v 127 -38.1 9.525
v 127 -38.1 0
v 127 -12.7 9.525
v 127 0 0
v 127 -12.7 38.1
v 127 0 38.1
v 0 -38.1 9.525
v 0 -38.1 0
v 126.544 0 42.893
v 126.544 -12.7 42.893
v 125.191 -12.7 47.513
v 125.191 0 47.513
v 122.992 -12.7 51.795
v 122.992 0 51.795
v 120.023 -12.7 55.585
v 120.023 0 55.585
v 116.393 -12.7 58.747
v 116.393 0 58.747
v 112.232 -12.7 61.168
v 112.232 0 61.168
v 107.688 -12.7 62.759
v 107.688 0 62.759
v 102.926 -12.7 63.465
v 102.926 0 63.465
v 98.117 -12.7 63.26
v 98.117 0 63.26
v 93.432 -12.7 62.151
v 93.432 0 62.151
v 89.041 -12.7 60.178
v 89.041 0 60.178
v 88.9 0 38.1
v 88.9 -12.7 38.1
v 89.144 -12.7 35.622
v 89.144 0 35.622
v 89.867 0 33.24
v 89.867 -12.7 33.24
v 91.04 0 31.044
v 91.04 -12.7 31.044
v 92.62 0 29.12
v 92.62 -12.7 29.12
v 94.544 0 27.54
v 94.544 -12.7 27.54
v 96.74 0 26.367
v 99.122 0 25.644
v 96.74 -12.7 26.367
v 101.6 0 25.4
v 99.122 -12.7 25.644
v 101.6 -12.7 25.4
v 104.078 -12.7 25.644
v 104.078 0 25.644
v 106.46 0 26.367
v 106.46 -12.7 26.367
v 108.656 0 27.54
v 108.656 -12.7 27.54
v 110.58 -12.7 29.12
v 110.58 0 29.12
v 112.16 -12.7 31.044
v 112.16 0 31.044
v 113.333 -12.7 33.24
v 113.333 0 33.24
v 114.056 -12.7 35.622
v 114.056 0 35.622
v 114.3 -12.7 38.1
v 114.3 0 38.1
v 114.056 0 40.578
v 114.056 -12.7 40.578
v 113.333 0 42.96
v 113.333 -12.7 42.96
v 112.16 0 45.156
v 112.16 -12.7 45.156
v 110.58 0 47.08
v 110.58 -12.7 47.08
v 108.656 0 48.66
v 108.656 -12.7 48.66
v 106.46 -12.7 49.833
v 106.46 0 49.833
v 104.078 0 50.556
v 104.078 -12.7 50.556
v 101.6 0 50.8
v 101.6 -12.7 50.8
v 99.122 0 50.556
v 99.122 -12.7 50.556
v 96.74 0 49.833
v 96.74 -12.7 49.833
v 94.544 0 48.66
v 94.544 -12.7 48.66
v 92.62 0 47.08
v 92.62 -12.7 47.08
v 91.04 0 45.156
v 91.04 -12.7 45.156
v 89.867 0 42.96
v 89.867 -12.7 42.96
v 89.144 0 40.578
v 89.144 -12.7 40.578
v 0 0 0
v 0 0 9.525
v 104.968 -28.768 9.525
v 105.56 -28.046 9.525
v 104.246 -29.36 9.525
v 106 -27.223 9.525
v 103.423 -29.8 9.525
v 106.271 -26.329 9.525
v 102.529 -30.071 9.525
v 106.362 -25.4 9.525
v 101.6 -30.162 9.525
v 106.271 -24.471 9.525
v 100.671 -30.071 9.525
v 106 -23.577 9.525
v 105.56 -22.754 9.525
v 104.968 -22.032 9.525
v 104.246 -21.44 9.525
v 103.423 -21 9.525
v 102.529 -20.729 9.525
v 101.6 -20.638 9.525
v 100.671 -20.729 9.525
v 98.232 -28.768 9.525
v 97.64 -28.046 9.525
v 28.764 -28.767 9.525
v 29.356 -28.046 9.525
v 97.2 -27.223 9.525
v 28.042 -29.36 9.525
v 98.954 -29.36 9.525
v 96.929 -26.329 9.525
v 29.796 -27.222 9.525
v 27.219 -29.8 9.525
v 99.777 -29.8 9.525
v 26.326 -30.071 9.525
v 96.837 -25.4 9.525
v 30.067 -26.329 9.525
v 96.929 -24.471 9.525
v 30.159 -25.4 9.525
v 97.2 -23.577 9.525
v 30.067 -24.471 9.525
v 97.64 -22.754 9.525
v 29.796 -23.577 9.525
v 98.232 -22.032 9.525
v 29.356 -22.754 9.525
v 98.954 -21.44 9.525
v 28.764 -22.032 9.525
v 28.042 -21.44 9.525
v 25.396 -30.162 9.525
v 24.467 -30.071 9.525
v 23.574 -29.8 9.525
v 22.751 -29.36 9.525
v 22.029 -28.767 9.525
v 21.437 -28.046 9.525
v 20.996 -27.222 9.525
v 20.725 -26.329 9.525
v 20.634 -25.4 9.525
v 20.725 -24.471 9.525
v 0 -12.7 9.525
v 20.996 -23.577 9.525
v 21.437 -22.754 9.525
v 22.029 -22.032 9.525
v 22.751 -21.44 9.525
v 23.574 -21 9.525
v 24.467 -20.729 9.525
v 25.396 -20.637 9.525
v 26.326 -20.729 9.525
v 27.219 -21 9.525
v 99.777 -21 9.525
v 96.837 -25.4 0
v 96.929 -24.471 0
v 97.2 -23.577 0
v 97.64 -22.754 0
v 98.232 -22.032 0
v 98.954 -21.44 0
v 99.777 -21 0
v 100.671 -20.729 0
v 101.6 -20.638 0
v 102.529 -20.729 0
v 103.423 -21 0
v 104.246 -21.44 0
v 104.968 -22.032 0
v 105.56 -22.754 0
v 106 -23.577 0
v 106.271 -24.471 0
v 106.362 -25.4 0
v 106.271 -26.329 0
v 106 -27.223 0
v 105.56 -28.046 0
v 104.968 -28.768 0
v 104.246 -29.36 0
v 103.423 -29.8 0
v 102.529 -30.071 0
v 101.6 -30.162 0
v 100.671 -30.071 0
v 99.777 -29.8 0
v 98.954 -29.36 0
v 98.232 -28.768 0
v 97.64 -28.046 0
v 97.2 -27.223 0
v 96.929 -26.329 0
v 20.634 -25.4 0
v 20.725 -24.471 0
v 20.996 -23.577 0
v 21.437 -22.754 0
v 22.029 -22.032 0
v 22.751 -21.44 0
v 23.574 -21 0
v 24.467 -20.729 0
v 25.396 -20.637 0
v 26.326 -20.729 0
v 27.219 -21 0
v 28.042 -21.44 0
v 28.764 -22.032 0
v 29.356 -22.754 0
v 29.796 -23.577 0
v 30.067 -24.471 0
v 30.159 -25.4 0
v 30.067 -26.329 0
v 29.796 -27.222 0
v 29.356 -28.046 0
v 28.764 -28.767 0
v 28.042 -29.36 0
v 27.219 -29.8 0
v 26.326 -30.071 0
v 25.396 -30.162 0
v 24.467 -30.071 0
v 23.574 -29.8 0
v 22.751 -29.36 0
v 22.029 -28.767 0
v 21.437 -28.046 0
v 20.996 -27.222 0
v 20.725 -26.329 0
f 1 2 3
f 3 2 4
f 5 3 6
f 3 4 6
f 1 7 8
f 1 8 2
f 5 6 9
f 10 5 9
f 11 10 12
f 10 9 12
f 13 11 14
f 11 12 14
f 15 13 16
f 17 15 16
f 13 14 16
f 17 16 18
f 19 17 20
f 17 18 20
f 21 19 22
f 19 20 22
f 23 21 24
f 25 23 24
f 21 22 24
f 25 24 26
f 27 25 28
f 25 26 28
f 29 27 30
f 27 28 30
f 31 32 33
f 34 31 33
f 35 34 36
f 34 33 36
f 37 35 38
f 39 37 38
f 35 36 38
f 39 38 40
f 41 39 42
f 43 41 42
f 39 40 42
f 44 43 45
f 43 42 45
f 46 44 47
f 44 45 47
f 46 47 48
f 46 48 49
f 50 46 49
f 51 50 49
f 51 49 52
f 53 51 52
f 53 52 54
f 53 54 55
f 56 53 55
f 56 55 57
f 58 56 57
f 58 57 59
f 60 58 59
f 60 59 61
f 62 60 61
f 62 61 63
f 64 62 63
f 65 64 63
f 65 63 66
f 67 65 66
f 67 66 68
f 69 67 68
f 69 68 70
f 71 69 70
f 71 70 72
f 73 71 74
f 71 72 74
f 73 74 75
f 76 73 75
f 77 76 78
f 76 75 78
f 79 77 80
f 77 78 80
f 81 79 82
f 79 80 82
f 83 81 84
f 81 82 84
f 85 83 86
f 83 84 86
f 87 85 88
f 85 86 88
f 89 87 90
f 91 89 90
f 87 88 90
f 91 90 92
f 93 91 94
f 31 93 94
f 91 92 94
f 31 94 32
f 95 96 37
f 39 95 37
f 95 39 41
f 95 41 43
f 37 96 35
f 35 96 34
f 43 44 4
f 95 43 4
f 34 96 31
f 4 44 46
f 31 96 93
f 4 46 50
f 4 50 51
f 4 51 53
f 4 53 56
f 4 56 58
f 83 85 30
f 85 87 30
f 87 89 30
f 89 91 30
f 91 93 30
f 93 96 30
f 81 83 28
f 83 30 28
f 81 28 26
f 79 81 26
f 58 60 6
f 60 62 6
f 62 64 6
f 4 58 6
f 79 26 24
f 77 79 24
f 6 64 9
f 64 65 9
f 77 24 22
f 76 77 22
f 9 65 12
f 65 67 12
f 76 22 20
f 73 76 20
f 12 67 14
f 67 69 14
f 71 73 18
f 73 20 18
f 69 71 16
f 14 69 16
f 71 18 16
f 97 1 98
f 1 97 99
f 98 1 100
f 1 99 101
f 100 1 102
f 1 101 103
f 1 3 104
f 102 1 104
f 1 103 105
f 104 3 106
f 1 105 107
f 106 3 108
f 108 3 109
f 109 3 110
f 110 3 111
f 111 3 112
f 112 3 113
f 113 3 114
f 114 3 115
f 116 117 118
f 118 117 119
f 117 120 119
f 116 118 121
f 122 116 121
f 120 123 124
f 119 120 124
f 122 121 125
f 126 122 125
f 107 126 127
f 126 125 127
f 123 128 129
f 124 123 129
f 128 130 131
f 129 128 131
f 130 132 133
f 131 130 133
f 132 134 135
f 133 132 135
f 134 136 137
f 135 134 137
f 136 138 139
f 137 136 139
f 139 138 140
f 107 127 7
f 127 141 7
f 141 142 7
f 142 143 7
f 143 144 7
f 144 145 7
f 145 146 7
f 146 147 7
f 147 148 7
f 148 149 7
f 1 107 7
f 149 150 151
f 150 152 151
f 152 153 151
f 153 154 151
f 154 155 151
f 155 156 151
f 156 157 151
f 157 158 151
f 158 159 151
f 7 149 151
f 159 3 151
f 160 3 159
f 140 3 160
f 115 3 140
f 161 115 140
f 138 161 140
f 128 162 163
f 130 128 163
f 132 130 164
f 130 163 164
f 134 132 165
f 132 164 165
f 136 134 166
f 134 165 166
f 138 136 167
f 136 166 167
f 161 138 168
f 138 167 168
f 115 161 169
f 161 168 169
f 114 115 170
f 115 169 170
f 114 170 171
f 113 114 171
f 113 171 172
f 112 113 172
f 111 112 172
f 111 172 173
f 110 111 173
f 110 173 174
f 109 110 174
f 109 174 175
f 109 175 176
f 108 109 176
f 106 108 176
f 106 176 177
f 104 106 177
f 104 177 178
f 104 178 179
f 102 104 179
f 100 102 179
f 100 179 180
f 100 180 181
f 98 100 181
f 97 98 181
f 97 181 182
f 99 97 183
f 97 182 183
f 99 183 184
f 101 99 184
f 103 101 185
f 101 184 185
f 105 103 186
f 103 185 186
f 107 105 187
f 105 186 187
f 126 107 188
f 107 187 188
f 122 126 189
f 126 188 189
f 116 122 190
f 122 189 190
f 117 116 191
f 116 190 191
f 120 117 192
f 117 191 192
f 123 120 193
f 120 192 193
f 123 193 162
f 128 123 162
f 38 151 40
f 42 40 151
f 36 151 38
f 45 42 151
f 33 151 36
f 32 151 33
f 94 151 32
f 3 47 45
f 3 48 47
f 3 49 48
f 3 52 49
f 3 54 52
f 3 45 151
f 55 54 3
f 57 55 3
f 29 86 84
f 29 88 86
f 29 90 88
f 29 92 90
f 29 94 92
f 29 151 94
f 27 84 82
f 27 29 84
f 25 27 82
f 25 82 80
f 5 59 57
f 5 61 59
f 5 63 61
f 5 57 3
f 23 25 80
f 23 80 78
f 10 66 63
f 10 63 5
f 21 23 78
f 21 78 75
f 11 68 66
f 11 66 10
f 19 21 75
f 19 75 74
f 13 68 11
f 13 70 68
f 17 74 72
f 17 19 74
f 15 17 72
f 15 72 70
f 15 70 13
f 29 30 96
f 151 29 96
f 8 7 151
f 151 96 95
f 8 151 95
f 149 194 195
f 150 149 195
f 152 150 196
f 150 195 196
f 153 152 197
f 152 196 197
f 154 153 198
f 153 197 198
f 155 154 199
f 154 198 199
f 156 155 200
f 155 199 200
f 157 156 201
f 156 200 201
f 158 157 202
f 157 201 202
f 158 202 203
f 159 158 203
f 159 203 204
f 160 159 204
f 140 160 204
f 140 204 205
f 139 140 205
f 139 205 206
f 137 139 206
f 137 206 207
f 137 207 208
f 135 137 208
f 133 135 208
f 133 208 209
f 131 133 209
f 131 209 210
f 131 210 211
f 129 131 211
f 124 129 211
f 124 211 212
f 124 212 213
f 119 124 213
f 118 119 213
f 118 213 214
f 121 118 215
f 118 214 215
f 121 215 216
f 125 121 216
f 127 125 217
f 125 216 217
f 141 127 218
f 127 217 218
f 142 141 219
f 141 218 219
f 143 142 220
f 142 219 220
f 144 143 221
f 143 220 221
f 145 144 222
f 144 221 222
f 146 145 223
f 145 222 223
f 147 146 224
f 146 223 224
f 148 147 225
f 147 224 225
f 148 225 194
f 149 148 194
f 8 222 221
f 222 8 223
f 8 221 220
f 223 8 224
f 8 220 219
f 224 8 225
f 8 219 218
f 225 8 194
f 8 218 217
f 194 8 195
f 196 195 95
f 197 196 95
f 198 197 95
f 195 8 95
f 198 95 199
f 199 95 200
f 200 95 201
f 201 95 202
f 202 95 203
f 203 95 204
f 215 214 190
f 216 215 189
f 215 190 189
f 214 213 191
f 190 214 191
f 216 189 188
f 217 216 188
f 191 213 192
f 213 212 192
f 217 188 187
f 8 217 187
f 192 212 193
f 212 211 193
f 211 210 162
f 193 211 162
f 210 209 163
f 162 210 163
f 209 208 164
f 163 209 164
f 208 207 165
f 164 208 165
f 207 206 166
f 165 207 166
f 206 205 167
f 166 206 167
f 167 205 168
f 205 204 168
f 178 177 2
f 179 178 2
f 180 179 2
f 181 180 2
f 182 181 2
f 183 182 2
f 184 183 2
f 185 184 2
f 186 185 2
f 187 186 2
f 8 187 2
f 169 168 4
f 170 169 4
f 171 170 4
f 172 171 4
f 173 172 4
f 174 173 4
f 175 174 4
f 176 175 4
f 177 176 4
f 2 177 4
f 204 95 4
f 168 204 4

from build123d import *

# Parameters (mm, degrees)
F1_DEPTH = 38.1
F2_DEPTH = 12.7
F5_D     = 9.525
F6_D     = 9.525
F7_D     = 25.4


with BuildPart() as f1:
    # F0 (on Front) → F1 (new body)
    with BuildSketch(Plane.XZ):
        Polygon((0, 9.525), (0, 0), (127, 0), (127, 9.525), (101.6, 9.525), align=None)
    extrude(amount=F1_DEPTH)

    # F0 (on Front) → F2 (join)
    with BuildSketch(Plane.XZ):
        with BuildLine():
            Line((89.0406588905, 60.1776572782), (0, 9.525))
            Line((0, 9.525), (101.6, 9.525))
            Line((101.6, 9.525), (127, 9.525))
            Line((127, 9.525), (127, 38.1))
            ThreePointArc((127, 38.1), (114.3701357827, 60.0564029862), (89.0406588905, 60.1776572782))
        make_face()
    extrude(amount=F2_DEPTH)

    # F5 (through all)
    with Locations(Plane.XY.offset(9.525)):
        with Locations((25.3964494914, -25.3996793181)):
            Hole(F5_D / 2)

    # F6 (through all)
    with Locations(Plane.XY.offset(9.525)):
        with Locations((101.6, -25.4)):
            Hole(F6_D / 2)

    # F7 (through all)
    with Locations(Plane(origin=(0, 0, 0), x_dir=(1, 0, 0), z_dir=(0, 1, 0))):
        with Locations((101.6, -38.1)):
            Hole(F7_D / 2)


solid = f1.part
